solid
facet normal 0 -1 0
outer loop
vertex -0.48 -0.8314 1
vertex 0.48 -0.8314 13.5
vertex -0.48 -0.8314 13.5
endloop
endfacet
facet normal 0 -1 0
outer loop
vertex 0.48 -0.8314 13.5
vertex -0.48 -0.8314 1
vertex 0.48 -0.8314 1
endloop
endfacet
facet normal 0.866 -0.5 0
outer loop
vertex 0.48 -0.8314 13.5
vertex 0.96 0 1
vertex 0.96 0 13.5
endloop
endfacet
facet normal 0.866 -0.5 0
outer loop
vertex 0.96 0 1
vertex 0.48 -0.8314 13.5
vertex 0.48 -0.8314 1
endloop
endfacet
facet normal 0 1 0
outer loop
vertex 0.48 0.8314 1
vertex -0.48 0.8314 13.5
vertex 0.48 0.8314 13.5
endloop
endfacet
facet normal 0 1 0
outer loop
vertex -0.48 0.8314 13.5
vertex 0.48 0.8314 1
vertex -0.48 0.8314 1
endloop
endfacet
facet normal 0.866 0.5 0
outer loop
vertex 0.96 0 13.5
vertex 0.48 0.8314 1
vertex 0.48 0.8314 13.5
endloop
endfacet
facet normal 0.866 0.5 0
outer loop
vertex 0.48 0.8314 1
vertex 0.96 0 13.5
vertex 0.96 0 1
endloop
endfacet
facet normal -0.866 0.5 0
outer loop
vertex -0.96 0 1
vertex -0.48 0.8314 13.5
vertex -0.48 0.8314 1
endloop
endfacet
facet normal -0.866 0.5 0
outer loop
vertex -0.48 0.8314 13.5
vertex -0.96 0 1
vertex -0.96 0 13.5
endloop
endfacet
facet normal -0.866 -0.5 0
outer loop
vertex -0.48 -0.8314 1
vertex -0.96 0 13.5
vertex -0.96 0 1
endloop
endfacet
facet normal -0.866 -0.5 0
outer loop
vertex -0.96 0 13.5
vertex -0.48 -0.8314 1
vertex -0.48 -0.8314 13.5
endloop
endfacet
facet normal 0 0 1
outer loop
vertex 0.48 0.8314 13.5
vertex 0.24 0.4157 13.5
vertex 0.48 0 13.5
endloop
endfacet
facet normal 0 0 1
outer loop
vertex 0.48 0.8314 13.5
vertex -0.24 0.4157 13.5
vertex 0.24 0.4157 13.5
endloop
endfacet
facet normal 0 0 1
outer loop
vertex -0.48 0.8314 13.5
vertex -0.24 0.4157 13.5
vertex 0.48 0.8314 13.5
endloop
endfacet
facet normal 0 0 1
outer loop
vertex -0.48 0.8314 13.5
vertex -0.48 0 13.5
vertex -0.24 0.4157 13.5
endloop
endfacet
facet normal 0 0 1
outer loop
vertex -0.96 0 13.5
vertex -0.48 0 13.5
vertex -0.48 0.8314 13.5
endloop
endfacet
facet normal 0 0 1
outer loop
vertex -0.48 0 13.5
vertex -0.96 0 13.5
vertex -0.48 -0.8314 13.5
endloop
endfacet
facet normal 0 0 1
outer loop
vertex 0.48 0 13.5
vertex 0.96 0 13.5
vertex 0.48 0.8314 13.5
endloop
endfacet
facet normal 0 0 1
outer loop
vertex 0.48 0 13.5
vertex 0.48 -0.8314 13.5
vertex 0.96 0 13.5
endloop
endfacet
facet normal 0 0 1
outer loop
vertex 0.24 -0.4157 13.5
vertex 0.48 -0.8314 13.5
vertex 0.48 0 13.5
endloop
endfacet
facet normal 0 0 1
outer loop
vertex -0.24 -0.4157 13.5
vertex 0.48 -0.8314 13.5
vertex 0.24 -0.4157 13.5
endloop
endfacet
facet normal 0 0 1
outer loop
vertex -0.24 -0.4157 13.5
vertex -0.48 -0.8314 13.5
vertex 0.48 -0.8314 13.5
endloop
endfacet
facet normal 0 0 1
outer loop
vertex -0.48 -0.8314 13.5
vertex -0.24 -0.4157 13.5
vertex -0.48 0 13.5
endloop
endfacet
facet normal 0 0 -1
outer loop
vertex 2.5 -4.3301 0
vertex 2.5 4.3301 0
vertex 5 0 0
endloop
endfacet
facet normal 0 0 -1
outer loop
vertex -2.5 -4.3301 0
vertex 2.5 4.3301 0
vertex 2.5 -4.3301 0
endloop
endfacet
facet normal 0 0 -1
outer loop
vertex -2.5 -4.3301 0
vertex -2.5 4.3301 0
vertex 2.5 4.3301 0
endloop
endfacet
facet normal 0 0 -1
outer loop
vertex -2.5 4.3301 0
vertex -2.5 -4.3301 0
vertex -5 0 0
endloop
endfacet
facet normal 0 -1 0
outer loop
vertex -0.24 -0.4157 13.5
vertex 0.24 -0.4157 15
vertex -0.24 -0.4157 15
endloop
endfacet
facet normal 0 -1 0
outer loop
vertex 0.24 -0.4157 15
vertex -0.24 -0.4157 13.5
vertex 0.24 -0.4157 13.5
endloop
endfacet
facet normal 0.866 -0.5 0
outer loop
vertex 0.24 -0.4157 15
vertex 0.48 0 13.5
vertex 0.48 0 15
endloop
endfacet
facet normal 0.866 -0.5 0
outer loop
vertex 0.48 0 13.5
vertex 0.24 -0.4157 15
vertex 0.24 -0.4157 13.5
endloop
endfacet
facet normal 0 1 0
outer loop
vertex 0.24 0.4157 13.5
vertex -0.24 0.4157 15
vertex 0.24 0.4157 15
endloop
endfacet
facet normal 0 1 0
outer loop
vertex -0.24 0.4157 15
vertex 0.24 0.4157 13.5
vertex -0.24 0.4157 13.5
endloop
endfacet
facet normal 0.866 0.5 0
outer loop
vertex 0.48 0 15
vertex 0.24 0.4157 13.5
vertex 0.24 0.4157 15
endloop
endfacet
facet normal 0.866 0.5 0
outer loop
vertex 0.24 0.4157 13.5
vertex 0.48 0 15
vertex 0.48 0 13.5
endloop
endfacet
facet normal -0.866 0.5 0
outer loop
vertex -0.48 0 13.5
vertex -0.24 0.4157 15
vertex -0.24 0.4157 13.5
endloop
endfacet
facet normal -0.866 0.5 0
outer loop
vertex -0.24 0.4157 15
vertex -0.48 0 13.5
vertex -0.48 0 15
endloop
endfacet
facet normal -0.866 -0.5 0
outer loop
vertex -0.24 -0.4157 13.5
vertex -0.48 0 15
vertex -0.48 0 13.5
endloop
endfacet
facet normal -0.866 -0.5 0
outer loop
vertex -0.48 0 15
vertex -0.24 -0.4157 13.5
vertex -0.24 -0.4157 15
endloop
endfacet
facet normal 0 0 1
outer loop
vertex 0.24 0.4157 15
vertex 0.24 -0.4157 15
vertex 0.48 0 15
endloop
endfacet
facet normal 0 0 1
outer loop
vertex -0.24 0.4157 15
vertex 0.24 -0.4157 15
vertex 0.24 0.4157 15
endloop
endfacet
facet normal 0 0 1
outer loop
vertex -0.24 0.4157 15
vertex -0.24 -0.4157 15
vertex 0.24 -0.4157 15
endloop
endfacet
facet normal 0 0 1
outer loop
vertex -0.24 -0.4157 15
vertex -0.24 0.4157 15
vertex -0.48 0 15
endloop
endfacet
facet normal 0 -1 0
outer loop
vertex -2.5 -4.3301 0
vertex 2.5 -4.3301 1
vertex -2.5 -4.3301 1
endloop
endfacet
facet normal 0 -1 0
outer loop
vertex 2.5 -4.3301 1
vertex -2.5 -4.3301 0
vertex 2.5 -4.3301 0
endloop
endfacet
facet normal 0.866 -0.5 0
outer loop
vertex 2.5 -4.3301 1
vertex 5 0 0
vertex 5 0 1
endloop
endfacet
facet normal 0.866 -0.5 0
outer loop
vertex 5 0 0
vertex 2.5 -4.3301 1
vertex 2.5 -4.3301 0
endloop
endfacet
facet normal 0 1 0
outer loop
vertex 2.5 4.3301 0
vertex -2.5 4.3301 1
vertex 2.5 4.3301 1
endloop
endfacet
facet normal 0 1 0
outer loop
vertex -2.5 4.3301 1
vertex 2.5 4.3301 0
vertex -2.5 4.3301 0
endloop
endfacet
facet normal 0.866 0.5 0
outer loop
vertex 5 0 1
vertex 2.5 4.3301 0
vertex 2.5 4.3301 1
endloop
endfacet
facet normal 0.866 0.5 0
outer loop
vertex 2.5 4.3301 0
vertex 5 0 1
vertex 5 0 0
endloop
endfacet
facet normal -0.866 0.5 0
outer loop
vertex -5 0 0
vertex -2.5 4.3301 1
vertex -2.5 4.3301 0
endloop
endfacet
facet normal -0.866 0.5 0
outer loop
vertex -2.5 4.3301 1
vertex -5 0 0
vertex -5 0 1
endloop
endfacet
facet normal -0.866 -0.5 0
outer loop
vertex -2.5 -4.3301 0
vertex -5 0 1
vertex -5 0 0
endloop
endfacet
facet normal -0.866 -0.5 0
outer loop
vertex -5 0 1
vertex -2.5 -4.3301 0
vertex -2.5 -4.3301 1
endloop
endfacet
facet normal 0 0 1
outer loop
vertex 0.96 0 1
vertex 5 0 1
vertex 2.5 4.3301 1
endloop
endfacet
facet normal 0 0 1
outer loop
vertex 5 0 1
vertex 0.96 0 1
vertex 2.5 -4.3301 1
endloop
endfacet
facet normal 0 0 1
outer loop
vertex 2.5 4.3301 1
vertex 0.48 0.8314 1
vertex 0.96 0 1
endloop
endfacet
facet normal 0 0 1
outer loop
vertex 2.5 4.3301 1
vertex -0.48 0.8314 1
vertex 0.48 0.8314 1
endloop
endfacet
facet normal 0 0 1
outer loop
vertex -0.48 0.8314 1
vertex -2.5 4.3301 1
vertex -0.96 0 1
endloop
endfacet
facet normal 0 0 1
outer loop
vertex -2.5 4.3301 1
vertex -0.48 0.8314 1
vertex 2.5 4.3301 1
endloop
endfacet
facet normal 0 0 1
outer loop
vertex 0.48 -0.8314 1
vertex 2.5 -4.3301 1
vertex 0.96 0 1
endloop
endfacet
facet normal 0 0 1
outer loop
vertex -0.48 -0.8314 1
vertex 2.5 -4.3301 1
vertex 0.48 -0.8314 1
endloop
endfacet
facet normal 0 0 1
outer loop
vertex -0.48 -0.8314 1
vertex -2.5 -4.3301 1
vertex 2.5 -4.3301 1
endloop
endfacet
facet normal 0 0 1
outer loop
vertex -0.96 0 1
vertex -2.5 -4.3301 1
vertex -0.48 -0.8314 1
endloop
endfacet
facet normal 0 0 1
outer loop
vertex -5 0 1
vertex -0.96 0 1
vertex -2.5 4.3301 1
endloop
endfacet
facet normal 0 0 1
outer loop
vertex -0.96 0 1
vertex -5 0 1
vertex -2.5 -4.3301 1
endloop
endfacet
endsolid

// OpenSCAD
// file: cookie_cutter.scad
module dxf(file, layer, height) {
   linear_extrude(height = height)
       import(file = file, layer = layer);
}

module needle(height, thin1, thin2) {
   union() {
      cylinder(r = thin1, h = height-1.5, $fn = 6);
      cylinder(r = thin2, h = height, $fn = 6);
   }
}

module wall(file, layer, height, thin) {
   difference() {
      minkowski() {
        dxf(file, layer, 0.01);
        cylinder(r = thin, h = height, $fn = 6);
      }
      translate([0, 0, -1]) dxf(file, layer, height + 2);
   }
}

module cutter(file, layer, height, nozzle_diameter) {
   thin1 = nozzle_diameter * 2.4;
   thin2 = nozzle_diameter * 1.2;
   difference() {
      minkowski() {
        dxf(file, layer, 0.01);
        needle(height, thin1, thin2);
      }
      translate([0, 0, -1]) dxf(file, layer, height + 2);
   }
}

module cookie_cutter(file, height, join_height, nozzle_diameter) {
   union () {
      cutter(file, "cutter", height, nozzle_diameter);
      wall(file, "outer", 1, 5);
      linear_extrude(height = join_height)
         import(file = file, layer = "join");
   }
}
// main file
include <cookie_cutter.scad>;
cookie_cutter("rosco.dxf", 15, 4, 0.4);
